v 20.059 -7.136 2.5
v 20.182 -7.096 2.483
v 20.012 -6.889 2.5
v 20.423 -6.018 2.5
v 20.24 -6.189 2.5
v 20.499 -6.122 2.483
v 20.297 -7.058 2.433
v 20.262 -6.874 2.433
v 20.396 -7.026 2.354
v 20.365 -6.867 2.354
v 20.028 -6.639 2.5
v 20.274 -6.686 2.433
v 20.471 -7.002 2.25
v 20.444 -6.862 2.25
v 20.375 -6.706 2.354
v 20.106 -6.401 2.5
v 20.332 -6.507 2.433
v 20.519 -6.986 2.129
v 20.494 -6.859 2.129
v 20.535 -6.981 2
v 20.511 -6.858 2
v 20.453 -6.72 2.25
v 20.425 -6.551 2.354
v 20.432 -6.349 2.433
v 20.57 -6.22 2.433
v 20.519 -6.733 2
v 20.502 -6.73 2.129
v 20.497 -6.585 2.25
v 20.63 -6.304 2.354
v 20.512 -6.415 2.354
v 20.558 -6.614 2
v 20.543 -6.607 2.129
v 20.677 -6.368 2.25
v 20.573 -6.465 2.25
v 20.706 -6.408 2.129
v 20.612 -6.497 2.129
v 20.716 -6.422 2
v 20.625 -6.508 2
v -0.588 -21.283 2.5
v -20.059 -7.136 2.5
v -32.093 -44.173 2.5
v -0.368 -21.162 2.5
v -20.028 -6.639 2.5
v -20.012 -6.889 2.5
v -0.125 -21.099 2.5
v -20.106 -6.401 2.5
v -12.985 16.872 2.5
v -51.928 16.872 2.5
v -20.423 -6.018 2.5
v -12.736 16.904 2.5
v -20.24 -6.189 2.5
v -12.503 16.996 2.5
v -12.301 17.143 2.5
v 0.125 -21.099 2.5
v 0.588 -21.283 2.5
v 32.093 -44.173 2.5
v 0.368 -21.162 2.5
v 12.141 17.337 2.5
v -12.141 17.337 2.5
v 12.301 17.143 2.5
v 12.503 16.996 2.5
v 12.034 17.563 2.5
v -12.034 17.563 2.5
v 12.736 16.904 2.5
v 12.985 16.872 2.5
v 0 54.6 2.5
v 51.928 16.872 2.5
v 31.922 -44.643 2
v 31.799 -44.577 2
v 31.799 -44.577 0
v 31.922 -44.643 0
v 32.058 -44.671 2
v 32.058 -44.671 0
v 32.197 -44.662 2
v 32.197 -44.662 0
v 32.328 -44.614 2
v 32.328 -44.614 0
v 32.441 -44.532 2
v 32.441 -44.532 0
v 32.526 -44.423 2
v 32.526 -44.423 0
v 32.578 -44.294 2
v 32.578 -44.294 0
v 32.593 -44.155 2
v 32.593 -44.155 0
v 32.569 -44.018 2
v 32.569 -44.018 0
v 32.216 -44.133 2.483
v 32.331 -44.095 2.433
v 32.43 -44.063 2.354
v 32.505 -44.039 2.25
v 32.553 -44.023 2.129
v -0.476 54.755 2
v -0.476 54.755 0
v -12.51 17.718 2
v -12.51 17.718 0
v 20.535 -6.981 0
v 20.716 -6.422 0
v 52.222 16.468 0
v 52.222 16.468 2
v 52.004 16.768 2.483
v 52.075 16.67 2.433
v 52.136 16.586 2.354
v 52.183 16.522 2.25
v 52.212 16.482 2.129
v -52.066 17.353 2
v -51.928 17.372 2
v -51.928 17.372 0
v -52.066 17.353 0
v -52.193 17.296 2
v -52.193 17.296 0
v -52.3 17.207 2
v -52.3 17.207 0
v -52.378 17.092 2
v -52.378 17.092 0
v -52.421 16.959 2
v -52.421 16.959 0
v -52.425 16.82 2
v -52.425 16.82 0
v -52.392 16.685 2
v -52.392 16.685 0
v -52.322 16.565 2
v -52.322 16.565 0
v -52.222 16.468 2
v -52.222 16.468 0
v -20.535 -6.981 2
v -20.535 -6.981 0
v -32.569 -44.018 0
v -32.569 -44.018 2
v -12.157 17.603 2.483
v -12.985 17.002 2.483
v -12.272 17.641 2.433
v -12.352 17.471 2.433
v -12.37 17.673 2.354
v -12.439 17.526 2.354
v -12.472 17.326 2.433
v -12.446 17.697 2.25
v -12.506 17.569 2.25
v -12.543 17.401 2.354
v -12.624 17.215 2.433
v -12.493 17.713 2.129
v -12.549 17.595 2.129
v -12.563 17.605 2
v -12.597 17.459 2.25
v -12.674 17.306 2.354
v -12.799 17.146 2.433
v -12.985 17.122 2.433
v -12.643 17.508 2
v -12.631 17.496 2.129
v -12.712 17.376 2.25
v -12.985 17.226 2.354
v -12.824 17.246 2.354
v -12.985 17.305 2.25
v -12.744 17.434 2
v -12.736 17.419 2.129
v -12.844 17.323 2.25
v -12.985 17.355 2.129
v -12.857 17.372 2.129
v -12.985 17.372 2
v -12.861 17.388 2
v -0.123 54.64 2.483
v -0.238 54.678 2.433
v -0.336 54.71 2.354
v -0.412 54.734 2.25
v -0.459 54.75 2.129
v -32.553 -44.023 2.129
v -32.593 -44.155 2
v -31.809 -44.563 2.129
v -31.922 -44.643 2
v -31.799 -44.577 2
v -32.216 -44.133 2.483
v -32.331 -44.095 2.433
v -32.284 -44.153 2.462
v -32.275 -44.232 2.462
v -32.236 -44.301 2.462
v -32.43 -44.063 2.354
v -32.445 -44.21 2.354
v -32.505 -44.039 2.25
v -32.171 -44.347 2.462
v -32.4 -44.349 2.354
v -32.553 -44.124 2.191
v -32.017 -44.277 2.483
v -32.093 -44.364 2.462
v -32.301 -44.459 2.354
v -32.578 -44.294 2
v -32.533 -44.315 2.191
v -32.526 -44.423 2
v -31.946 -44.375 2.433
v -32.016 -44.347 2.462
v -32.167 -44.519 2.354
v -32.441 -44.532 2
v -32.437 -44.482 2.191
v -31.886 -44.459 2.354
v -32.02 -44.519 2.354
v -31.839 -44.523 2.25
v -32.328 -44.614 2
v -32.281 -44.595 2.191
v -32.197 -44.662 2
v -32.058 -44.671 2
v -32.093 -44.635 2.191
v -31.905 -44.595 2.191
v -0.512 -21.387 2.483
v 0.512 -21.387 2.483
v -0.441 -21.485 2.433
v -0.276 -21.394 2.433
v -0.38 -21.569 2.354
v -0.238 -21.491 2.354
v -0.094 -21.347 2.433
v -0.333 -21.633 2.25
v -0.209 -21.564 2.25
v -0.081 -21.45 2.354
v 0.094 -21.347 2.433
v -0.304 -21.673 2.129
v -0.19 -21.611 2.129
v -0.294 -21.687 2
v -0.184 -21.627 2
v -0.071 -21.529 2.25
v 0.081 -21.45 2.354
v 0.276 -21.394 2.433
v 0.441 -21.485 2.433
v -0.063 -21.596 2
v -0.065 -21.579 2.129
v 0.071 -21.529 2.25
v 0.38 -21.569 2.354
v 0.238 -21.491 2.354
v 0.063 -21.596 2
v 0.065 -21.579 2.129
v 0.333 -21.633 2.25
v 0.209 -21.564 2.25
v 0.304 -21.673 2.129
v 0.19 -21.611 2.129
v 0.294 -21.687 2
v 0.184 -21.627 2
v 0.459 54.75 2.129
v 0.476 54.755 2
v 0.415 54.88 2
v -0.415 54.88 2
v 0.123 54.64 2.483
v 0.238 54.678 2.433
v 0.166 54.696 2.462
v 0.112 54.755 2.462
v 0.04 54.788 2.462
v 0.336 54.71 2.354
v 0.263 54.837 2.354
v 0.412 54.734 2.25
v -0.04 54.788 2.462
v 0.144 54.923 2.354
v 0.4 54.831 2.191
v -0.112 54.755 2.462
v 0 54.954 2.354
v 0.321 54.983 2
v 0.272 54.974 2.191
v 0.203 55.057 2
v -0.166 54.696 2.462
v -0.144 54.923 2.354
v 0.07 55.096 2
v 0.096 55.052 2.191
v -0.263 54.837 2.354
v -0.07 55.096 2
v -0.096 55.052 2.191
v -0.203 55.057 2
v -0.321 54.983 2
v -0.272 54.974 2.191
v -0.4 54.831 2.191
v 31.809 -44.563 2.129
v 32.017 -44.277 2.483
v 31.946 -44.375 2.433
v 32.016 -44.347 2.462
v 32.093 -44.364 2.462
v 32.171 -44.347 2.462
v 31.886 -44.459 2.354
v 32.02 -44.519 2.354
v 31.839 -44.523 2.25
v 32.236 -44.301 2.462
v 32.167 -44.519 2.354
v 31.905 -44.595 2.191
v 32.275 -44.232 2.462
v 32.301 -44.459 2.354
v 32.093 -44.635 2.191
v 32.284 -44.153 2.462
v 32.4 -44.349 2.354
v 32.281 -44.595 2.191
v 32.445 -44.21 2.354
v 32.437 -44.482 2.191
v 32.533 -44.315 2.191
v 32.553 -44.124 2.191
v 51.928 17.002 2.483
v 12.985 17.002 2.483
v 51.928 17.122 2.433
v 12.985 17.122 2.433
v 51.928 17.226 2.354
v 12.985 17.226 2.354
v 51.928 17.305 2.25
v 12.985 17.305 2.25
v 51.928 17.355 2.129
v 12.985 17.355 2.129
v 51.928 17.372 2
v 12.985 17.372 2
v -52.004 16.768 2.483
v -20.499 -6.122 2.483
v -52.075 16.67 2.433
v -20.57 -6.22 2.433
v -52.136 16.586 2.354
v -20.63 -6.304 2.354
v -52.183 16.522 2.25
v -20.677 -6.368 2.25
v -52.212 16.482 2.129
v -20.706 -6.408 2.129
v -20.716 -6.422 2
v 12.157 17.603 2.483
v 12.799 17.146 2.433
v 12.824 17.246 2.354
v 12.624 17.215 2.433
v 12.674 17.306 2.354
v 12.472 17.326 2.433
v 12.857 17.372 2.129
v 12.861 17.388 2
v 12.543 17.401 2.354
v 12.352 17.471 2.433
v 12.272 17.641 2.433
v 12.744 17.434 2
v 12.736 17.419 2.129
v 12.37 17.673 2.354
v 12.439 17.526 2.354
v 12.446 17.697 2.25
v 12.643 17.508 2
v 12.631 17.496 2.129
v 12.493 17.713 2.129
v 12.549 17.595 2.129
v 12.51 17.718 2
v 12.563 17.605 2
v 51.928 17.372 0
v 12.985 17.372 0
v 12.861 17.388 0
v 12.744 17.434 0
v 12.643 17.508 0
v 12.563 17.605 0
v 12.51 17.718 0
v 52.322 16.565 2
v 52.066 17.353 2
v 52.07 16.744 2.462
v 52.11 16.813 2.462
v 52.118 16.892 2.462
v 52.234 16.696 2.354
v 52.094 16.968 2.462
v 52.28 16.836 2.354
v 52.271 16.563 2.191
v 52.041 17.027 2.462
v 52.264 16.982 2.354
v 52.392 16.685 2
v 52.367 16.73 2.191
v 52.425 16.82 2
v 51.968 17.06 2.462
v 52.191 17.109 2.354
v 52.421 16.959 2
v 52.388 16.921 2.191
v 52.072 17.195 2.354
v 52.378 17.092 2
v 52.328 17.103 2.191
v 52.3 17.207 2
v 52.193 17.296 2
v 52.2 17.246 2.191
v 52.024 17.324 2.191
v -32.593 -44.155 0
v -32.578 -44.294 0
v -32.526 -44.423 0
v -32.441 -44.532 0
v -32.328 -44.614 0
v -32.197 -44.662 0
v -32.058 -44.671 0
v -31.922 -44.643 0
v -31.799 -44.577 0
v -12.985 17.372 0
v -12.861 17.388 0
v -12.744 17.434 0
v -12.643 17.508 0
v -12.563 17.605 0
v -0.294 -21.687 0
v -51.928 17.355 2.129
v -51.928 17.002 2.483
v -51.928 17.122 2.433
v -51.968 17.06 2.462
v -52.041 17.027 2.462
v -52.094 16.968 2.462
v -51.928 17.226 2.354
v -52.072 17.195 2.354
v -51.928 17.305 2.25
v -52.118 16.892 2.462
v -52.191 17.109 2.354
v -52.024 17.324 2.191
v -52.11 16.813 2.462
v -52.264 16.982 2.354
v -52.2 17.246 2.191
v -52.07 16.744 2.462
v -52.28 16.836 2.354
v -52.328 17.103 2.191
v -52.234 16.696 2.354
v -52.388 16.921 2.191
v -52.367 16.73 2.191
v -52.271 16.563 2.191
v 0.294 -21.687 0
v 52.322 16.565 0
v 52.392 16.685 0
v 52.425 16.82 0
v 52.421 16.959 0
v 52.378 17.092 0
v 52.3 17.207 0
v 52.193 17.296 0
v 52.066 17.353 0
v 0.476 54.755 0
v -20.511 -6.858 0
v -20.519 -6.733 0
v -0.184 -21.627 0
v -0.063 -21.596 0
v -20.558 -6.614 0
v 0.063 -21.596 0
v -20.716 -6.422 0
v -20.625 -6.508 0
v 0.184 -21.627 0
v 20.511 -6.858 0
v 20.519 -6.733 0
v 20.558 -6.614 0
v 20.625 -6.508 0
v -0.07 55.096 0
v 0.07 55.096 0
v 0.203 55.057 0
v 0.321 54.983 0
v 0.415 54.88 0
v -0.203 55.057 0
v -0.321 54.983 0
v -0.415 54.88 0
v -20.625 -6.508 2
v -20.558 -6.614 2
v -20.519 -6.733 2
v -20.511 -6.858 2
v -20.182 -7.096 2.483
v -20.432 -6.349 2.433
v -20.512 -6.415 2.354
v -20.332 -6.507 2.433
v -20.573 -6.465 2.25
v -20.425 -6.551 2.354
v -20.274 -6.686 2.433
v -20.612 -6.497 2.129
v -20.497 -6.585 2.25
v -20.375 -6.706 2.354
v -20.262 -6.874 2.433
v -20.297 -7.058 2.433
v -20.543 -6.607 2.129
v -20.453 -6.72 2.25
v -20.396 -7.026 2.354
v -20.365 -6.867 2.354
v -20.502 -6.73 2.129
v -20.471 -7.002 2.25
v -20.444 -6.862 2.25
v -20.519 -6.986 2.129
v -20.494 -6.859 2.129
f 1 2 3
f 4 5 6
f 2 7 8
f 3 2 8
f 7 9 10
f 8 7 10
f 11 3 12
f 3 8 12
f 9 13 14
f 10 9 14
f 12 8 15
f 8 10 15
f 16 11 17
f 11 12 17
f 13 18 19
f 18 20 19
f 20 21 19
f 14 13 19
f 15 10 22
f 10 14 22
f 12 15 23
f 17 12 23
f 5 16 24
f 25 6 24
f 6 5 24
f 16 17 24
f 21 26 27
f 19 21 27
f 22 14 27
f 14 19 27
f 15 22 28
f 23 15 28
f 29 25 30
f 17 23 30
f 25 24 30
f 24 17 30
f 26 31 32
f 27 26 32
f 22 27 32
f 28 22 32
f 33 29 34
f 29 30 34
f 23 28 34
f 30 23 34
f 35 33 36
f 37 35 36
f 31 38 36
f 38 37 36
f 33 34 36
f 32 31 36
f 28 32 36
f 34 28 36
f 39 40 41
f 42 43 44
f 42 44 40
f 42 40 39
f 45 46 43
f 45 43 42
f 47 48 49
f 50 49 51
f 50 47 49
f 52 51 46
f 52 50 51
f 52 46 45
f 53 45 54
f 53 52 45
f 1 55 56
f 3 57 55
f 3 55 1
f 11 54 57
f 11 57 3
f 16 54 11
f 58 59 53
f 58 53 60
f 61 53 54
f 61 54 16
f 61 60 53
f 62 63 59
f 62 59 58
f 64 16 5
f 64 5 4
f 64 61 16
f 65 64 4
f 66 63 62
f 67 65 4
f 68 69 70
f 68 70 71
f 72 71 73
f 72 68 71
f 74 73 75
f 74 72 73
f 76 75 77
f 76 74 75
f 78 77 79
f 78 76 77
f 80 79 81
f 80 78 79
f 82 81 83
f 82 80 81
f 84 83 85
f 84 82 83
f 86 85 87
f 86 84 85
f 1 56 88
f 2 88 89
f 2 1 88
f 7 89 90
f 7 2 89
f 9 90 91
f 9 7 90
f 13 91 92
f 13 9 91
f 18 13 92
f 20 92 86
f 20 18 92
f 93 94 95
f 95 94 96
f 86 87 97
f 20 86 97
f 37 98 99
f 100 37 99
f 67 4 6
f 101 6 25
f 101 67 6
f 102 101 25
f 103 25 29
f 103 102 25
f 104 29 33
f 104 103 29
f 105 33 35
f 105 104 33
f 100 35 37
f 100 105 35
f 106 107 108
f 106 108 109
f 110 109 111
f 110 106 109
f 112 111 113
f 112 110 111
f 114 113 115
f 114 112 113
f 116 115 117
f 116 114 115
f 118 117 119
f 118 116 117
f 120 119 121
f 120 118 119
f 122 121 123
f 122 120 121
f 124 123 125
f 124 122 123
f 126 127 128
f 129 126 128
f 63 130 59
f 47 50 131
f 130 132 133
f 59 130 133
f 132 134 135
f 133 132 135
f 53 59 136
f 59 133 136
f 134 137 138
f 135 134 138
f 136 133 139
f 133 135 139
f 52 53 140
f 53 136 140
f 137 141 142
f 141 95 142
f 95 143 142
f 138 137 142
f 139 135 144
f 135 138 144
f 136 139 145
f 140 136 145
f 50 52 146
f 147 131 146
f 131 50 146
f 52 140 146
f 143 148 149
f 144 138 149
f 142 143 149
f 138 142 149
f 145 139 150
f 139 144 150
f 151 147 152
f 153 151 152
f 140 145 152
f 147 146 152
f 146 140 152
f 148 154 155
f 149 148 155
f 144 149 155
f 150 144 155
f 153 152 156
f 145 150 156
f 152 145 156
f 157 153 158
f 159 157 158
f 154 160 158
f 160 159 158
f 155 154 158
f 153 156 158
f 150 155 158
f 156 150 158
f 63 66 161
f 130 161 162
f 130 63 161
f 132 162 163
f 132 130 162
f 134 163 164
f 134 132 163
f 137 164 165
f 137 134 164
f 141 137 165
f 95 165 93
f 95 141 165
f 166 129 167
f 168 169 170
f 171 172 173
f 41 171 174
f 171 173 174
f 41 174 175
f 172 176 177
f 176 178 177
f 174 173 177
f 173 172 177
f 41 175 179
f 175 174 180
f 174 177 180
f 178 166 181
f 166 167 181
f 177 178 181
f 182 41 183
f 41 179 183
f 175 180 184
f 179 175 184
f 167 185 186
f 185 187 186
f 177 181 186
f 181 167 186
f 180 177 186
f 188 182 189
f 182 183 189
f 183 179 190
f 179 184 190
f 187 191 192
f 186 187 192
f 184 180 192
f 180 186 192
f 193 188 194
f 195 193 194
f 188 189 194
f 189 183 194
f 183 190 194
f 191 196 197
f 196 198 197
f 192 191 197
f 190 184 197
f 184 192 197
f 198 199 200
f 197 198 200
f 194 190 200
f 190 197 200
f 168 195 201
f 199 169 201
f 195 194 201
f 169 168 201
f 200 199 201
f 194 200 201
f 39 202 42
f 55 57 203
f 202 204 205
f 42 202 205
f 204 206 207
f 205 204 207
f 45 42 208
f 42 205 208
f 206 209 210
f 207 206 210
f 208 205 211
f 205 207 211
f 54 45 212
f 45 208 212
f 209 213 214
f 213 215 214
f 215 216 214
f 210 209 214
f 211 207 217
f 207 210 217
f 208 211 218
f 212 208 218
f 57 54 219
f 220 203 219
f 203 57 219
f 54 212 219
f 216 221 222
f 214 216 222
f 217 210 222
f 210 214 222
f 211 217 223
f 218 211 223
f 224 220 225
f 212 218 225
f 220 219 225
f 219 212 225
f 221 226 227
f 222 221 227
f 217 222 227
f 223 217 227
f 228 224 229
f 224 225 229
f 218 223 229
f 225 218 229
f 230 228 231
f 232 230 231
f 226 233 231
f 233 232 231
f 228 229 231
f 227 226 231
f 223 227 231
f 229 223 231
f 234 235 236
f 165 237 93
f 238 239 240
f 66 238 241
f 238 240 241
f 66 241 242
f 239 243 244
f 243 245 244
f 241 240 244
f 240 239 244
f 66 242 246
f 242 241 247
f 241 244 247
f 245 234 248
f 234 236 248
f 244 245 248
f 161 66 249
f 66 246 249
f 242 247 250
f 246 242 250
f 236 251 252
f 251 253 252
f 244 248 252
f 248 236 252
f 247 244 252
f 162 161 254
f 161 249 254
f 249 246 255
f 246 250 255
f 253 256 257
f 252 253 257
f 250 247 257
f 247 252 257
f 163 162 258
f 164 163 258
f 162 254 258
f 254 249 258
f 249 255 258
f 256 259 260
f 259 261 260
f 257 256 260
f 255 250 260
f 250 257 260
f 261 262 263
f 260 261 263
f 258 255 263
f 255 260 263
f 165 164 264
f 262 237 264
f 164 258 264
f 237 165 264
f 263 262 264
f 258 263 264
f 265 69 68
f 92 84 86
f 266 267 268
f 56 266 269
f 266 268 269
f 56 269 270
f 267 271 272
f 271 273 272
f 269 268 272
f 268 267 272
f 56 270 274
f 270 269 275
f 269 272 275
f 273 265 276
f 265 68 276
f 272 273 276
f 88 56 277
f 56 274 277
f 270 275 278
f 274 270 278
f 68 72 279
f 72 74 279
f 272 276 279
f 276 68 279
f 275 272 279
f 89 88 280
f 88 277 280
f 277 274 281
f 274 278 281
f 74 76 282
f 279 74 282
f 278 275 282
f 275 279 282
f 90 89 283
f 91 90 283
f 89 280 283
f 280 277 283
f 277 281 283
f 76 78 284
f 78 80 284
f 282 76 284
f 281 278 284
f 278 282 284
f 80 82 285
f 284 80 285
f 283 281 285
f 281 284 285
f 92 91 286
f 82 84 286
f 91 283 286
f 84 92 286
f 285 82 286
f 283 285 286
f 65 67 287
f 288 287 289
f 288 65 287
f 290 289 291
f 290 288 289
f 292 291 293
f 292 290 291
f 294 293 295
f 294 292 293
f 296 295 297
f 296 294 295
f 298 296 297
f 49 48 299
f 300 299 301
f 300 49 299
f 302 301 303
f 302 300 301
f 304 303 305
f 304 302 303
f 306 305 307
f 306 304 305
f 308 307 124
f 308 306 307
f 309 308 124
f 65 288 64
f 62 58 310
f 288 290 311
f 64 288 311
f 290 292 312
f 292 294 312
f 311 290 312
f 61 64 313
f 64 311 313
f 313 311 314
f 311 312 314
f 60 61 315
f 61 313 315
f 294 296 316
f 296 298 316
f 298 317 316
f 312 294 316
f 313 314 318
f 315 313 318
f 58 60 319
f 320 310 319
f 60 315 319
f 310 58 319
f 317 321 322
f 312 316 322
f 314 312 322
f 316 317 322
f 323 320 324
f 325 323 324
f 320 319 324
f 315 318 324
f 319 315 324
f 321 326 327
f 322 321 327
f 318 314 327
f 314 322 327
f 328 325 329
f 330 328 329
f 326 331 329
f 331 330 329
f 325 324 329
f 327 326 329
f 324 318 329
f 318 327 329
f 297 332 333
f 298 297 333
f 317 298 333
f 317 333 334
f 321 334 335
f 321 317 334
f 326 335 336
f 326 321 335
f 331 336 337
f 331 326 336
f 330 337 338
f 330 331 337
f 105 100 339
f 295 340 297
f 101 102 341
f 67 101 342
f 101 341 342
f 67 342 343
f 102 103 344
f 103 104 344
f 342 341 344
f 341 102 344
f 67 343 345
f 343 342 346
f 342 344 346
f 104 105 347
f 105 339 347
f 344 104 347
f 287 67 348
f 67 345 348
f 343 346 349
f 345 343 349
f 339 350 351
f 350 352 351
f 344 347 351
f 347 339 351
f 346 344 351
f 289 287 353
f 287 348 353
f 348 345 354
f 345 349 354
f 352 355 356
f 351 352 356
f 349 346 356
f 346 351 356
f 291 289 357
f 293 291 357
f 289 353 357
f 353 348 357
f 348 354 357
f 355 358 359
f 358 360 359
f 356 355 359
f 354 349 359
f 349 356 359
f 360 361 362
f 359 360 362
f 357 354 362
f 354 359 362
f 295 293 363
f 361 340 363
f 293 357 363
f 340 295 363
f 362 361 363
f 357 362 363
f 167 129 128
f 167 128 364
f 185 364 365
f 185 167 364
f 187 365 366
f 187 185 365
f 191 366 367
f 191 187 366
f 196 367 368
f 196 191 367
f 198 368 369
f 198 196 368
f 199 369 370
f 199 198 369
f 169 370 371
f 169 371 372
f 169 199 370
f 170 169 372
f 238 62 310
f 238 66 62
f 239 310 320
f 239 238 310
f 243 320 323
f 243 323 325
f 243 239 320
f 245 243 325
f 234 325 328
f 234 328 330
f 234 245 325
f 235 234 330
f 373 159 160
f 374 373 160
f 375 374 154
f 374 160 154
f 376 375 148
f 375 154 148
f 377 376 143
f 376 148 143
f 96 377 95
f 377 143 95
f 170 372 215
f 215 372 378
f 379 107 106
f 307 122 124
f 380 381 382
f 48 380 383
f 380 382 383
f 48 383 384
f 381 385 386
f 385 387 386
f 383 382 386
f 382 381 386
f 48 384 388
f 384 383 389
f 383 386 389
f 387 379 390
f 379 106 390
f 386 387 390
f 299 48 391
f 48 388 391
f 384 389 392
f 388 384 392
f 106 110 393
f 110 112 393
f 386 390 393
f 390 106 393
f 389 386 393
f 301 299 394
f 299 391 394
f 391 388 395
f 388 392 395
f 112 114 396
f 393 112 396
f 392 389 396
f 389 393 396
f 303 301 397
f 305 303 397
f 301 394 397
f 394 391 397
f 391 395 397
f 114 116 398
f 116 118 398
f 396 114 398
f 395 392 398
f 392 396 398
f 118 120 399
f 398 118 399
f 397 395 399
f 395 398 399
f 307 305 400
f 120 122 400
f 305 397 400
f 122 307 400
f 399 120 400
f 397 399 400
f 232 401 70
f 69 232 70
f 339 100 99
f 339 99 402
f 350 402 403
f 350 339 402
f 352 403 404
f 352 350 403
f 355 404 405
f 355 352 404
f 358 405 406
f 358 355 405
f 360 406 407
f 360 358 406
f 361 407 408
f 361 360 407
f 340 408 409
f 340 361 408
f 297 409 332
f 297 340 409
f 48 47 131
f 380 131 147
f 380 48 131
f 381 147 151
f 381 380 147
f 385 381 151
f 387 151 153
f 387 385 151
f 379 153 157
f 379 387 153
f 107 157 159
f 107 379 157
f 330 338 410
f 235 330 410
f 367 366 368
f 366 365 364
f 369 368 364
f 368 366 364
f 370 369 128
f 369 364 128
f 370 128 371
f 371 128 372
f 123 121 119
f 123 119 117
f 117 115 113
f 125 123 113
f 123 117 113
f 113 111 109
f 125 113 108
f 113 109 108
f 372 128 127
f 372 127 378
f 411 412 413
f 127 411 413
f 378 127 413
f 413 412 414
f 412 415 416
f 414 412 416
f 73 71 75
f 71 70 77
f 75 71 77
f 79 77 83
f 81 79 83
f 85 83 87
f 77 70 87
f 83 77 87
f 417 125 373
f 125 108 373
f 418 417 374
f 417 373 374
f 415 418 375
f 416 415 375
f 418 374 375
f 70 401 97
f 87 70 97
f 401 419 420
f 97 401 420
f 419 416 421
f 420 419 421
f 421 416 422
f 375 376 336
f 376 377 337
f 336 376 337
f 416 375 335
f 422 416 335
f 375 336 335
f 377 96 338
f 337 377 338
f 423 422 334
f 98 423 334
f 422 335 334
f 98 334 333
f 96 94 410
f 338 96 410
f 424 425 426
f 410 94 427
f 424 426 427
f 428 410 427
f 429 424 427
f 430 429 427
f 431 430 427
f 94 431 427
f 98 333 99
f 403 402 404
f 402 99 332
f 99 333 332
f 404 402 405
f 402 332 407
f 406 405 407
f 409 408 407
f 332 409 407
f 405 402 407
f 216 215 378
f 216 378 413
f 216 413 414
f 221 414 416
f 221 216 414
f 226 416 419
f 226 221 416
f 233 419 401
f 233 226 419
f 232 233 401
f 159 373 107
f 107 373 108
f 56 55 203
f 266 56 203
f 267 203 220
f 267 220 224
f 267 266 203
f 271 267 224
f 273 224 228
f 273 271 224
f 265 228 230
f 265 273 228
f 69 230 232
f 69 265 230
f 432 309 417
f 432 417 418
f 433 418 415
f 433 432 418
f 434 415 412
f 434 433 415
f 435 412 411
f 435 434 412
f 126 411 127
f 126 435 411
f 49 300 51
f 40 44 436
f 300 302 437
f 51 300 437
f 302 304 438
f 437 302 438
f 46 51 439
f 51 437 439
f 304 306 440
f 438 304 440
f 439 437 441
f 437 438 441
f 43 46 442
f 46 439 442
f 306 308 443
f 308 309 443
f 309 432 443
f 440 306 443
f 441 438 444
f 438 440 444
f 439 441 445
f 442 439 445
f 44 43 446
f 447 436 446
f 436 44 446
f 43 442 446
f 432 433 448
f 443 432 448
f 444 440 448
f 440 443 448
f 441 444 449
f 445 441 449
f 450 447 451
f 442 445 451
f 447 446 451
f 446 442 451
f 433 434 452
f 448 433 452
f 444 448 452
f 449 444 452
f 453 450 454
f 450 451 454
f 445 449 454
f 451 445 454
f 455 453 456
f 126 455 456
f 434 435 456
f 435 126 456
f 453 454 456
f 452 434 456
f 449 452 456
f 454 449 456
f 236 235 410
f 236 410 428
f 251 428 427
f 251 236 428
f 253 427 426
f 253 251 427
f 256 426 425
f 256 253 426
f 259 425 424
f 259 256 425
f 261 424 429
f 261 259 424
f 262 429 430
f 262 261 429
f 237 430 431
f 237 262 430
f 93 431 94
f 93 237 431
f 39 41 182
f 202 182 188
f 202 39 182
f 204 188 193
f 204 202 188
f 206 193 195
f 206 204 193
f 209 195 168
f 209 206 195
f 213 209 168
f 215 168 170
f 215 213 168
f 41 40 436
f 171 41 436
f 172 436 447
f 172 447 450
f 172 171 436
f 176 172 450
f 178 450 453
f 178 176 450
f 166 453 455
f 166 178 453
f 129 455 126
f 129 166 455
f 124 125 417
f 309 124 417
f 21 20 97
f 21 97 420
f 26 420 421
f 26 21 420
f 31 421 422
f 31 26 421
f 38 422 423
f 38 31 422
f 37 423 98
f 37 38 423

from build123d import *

# Parameters (mm, degrees)
F1_DEPTH = 2.5
F2_R     = 0.5
F3_R     = 0.5


with BuildPart() as f1:
    # F0 (on Top) → F1 (new body)
    with BuildSketch(Plane.XY):
        Polygon((-20.4225578644, -6.6356912976), (-12.6218348974, 17.372465356), (-53.4669506262, 17.372465356), align=None)
        Polygon((12.6218348974, 17.372465356), (0, 56.2184788287), (-12.6218348974, 17.372465356), align=None)
        Polygon((12.6218348974, 17.372465356), (-12.6218348974, 17.372465356), (-20.4225578644, -6.6356912976), (0, -21.4735481167), (20.4225578644, -6.6356912976), align=None)
        Polygon((53.4669506262, 17.372465356), (12.6218348974, 17.372465356), (20.4225578644, -6.6356912976), align=None)
        Polygon((33.0443927618, -45.4817047703), (20.4225578644, -6.6356912976), (0, -21.4735481167), align=None)
        Polygon((0, -21.4735481167), (-20.4225578644, -6.6356912976), (-33.0443927618, -45.4817047703), align=None)
    extrude(amount=F1_DEPTH)

    # F2
    f2_edges = [f1.edges().sort_by_distance(p)[0] for p in [
        (0, 56.218479, 1.25),
        (-53.466951, 17.372465, 1.25),
        (-33.044393, -45.481705, 1.25),
        (33.044393, -45.481705, 1.25),
        (53.466951, 17.372465, 1.25),
        (-20.422558, -6.635691, 1.25),
        (-12.621835, 17.372465, 1.25),
        (12.621835, 17.372465, 1.25),
        (20.422558, -6.635691, 1.25),
        (0, -21.473548, 1.25),
    ]]
    fillet(f2_edges, radius=F2_R)

    # F3
    f3_edges = [f1.edges().sort_by_distance(p)[0] for p in [
        (6.492553, 36.236455, 2.5),
        (-6.492553, 36.236455, 2.5),
        (32.456608, 17.372465, 2.5),
        (36.469226, 5.022896, 2.5),
        (26.55184, -25.499681, 2.5),
        (16.046668, -33.132135, 2.5),
        (-16.046668, -33.132135, 2.5),
        (-26.55184, -25.499681, 2.5),
        (-36.469226, 5.022896, 2.5),
        (-32.456608, 17.372465, 2.5),
        (-32.387229, -44.577196, 2.5),
        (32.387229, -44.577196, 2.5),
        (52.403637, 17.026974, 2.5),
        (0, 55.100445, 2.5),
        (-52.403637, 17.026974, 2.5),
    ]]
    fillet(f3_edges, radius=F3_R)


solid = f1.part
